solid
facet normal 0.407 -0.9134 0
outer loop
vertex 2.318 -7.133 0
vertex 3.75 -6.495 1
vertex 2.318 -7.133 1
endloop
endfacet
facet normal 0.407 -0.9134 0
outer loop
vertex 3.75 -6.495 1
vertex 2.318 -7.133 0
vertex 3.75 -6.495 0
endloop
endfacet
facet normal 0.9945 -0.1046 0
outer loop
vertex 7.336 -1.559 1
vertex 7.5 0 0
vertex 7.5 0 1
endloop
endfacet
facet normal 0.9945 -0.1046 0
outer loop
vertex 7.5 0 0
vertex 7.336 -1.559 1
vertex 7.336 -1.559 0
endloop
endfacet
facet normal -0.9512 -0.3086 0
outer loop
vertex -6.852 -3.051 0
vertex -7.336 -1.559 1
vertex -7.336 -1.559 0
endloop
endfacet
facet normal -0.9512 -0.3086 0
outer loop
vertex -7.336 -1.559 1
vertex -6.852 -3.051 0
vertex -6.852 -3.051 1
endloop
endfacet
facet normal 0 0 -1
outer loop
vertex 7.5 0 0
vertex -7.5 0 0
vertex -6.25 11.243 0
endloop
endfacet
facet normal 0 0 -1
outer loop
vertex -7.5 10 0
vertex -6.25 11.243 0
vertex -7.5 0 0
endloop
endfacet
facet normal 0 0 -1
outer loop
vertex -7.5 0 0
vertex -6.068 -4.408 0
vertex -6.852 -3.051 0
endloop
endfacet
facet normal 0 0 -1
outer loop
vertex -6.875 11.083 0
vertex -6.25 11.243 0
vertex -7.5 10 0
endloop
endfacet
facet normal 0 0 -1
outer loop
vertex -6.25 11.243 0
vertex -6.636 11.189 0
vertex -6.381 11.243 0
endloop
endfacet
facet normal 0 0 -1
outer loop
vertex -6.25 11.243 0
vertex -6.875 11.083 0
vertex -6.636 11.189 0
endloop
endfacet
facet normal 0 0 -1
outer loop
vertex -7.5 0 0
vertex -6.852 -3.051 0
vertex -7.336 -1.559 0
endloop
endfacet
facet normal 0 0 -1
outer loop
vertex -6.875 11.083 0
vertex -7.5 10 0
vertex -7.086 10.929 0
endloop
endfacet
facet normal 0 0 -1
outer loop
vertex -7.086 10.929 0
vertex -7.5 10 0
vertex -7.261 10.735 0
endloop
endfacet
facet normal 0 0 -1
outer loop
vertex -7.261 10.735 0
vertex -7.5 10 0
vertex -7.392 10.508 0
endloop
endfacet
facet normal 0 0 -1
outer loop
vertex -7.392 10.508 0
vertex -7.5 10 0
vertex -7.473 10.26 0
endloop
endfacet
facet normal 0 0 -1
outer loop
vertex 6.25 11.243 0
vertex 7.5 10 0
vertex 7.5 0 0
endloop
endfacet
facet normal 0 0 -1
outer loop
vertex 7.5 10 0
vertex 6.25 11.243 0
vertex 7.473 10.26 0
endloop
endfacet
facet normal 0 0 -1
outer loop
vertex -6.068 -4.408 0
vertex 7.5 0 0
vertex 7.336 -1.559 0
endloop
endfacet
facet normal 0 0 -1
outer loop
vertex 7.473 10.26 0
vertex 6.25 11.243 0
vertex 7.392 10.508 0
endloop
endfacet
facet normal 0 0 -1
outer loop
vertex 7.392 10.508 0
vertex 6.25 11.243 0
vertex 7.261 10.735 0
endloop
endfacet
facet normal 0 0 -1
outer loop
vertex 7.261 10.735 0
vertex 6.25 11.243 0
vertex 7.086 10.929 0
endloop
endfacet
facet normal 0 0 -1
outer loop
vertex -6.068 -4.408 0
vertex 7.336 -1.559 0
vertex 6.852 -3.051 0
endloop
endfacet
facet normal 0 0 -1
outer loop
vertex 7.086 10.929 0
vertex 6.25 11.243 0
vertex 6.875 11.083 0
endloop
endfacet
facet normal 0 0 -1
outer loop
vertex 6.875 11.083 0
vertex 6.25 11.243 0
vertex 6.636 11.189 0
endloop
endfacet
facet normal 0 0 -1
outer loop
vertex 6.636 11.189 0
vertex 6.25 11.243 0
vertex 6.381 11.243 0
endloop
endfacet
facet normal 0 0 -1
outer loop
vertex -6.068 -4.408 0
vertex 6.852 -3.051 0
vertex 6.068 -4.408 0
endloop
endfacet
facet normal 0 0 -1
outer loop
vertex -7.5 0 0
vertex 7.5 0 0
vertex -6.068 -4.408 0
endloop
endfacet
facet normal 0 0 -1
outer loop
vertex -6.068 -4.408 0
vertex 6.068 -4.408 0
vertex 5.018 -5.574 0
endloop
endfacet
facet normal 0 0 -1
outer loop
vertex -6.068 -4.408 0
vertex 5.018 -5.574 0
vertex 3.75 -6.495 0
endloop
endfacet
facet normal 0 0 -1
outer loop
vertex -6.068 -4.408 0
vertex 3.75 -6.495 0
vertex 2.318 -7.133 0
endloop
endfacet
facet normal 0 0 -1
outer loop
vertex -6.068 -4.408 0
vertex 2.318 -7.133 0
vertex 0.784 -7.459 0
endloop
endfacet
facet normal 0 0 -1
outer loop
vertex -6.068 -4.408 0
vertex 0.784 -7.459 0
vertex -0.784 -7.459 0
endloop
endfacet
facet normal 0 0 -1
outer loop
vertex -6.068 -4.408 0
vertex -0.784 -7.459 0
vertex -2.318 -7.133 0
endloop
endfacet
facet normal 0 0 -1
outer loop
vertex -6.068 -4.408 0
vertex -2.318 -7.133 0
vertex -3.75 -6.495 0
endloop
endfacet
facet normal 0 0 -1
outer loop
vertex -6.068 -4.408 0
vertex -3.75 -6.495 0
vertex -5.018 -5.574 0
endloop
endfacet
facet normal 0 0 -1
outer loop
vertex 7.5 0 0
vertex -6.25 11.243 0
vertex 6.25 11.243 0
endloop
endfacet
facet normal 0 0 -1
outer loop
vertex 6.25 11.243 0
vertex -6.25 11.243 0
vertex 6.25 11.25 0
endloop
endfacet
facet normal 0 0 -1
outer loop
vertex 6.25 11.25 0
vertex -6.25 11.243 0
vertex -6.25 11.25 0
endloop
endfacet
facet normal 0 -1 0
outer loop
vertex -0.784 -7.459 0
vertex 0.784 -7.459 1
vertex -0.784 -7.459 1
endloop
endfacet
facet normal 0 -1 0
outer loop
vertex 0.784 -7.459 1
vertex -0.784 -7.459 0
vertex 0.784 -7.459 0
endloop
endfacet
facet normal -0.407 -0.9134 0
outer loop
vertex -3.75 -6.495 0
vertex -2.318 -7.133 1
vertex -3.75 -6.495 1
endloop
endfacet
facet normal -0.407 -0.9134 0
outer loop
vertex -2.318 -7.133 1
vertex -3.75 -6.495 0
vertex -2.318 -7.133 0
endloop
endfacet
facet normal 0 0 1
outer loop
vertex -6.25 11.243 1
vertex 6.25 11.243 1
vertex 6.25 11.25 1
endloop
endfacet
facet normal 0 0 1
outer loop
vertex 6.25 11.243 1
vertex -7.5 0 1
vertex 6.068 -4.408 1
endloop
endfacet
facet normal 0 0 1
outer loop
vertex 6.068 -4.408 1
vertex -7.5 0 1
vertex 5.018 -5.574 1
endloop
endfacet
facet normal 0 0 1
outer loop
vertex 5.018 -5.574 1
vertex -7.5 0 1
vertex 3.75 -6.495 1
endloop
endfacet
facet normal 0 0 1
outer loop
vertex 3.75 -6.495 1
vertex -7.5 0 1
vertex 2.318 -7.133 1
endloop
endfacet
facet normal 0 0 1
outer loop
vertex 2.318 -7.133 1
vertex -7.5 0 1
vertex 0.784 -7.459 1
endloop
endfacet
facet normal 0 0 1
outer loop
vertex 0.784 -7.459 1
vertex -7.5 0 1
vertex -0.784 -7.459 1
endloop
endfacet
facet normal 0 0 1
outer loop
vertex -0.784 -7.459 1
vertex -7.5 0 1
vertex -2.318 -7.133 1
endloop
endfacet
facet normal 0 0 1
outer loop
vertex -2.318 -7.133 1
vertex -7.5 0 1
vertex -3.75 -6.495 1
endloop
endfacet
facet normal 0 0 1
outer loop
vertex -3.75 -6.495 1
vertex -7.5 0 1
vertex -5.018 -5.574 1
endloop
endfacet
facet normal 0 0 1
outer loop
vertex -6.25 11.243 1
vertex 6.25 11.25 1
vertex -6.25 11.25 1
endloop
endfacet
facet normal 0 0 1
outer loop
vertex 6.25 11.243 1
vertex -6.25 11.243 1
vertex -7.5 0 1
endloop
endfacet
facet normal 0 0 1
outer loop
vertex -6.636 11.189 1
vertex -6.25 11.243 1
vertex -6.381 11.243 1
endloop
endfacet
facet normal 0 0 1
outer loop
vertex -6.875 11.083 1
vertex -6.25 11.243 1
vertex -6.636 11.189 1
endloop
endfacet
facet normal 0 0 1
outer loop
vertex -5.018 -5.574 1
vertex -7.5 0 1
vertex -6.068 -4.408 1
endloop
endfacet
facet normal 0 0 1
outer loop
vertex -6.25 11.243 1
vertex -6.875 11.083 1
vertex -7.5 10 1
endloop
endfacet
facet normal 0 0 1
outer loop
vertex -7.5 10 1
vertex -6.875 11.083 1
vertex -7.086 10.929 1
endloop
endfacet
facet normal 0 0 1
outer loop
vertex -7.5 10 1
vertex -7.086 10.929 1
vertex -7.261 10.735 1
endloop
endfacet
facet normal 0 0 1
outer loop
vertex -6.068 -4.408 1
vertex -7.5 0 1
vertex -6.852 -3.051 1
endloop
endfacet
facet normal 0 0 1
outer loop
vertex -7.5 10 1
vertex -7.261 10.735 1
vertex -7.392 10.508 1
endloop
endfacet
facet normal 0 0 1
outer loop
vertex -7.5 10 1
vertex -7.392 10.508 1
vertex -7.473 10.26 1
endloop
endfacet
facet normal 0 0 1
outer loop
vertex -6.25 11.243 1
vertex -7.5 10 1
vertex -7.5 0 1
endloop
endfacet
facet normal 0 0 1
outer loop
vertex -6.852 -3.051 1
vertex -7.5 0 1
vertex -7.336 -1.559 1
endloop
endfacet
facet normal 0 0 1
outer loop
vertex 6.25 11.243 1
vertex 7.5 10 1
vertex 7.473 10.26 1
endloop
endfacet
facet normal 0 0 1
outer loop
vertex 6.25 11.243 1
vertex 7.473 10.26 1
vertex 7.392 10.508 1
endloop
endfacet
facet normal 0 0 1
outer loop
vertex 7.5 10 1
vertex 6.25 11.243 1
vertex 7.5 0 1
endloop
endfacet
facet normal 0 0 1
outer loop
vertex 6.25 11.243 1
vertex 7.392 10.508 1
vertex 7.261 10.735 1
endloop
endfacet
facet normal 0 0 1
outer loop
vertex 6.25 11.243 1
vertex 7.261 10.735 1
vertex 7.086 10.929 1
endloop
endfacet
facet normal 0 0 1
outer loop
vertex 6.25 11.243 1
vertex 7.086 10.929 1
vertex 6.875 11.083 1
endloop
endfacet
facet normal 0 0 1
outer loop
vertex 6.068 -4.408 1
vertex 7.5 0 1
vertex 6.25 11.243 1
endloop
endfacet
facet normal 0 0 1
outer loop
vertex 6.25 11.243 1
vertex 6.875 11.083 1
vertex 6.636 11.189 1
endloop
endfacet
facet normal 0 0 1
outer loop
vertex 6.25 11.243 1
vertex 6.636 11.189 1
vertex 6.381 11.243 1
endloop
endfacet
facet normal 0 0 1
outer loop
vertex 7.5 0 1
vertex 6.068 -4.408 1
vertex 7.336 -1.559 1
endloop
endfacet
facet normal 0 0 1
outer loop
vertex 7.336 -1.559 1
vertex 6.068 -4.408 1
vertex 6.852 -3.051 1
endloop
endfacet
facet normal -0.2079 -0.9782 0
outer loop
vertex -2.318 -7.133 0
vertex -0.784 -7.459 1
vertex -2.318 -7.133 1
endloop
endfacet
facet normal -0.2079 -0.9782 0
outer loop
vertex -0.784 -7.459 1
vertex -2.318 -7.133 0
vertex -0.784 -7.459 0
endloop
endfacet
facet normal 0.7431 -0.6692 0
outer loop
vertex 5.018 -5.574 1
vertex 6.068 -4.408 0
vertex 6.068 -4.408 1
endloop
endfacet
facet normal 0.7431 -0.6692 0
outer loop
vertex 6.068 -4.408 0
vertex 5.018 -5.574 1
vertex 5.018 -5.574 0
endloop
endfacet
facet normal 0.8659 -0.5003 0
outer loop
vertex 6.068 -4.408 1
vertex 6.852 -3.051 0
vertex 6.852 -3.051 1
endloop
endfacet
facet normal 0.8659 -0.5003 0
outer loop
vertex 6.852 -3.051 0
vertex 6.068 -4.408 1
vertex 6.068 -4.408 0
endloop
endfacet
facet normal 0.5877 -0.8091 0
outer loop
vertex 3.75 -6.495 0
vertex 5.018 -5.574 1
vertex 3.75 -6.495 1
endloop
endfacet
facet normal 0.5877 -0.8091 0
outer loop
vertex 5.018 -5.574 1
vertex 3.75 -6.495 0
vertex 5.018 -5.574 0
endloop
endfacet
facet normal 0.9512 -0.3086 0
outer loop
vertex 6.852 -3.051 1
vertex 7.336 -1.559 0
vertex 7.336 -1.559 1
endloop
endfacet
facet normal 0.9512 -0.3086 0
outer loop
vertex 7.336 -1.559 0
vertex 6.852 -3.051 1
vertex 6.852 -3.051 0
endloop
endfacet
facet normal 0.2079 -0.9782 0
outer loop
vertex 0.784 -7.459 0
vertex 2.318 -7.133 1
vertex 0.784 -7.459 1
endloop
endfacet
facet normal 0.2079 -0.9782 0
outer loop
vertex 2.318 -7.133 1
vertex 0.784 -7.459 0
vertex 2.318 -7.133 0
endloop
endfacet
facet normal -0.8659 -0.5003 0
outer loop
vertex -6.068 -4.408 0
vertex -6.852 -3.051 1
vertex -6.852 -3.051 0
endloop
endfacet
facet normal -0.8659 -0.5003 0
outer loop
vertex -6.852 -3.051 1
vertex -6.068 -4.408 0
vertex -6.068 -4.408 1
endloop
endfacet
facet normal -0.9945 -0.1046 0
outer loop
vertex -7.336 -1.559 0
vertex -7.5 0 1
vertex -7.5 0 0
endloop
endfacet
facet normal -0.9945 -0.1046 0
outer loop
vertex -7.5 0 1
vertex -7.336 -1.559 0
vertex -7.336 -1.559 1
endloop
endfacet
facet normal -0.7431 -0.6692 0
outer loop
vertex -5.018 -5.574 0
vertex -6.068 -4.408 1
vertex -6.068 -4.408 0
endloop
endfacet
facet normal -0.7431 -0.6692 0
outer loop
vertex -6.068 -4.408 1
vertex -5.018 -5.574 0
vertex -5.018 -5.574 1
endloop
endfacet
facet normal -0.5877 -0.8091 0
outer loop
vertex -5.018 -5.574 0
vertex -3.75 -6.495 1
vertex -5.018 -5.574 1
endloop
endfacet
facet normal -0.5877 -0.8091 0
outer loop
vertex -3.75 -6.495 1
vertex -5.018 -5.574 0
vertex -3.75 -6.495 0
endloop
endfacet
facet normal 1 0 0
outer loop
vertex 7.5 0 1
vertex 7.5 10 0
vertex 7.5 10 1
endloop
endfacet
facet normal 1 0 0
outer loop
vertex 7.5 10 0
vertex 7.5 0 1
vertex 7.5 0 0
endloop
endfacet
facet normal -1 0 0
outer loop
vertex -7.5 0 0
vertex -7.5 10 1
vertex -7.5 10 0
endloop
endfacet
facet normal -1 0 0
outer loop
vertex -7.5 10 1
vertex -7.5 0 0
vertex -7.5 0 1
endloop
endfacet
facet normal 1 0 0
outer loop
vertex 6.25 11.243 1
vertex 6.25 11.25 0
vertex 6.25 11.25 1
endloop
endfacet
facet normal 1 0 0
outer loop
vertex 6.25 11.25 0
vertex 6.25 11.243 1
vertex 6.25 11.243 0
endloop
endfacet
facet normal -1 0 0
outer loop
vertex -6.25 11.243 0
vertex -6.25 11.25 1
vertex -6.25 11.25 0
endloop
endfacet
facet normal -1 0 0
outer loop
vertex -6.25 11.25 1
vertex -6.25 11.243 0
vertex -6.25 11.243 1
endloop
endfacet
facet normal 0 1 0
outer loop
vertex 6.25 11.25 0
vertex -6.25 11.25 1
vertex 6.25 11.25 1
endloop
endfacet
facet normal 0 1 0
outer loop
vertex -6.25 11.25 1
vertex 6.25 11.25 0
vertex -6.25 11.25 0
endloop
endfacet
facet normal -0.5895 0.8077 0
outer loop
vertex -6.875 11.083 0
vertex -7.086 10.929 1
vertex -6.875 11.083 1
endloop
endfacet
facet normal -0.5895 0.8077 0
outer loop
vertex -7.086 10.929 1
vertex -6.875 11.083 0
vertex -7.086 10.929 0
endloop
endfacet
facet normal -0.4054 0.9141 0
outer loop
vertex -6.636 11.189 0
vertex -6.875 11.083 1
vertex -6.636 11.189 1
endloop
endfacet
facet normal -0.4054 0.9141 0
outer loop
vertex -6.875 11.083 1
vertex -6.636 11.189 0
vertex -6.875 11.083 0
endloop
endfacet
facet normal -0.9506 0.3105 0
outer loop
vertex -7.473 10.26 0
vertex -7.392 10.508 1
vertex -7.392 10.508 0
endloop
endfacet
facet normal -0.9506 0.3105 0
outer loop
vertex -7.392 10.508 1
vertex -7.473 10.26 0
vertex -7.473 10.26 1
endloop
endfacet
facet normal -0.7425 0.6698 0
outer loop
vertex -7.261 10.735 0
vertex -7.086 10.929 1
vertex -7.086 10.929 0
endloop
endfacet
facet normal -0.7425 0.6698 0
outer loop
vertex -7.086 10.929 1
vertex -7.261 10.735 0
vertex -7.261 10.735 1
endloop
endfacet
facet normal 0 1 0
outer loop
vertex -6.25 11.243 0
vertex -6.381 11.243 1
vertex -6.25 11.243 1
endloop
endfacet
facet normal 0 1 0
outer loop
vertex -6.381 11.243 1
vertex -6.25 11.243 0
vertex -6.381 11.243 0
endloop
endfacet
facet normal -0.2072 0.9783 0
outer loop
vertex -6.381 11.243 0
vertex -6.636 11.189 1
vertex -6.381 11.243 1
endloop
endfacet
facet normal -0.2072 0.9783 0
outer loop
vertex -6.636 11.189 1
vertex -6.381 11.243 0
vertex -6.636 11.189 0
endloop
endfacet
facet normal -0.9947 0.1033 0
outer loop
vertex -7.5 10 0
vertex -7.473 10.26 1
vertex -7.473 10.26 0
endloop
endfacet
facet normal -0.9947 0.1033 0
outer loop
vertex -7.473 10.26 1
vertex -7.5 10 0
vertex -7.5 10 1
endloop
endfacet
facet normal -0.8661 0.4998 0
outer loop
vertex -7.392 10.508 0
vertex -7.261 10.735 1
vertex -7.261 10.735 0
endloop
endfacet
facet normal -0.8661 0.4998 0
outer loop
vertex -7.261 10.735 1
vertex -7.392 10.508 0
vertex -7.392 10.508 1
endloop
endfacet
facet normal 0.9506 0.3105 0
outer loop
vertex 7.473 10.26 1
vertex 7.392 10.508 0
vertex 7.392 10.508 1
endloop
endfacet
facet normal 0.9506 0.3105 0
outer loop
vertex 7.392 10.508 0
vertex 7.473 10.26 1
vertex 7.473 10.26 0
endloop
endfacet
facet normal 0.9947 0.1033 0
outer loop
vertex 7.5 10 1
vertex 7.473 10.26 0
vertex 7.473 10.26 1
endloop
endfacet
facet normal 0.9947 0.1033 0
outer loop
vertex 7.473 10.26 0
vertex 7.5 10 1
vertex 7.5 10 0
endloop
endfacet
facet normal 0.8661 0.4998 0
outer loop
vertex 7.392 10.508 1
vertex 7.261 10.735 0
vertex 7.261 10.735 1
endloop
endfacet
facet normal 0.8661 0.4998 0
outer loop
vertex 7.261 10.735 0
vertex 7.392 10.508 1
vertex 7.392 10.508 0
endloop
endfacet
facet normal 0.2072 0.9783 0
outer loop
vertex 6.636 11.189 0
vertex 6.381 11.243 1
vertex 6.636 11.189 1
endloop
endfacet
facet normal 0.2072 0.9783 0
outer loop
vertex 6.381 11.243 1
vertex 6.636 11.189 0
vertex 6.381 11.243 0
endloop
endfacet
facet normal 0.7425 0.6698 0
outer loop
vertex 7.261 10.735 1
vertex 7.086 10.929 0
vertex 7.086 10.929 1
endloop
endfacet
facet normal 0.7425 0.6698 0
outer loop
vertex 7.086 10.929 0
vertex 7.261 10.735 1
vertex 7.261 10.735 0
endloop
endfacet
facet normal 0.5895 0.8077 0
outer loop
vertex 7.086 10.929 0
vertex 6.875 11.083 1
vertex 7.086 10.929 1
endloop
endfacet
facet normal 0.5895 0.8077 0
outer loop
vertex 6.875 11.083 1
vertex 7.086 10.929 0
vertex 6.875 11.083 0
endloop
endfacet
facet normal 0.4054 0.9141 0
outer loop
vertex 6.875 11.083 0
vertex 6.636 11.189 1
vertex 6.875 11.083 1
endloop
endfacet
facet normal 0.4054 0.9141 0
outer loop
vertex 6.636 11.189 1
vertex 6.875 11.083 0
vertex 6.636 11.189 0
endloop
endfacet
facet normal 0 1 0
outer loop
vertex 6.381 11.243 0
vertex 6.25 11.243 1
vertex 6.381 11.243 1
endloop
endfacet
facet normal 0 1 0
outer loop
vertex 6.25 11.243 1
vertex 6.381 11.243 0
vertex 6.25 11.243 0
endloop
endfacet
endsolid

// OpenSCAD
length=17.5; //[8:35]
width=15; //[5:30]
thickness=1; //[1:4]
difference()
{
union()
{
scale(0.1) cylinder(r=width*5,h=thickness*10);
translate([width/-2,0,0]) scale([width,length-(width/2),thickness]) cube(1);
translate([(width/-2)+1.25,length-(width/2),0]) scale([width-2.5,1.25,thickness]) cube(1);
translate([(width/-2)+1.25,length-(width/2),0]) scale(0.1) cylinder(r=12.5,h=thickness*10);
translate([(width/2)-1.25,length-(width/2),0]) scale(0.1) cylinder(r=12.5,h=thickness*10);
}
}
